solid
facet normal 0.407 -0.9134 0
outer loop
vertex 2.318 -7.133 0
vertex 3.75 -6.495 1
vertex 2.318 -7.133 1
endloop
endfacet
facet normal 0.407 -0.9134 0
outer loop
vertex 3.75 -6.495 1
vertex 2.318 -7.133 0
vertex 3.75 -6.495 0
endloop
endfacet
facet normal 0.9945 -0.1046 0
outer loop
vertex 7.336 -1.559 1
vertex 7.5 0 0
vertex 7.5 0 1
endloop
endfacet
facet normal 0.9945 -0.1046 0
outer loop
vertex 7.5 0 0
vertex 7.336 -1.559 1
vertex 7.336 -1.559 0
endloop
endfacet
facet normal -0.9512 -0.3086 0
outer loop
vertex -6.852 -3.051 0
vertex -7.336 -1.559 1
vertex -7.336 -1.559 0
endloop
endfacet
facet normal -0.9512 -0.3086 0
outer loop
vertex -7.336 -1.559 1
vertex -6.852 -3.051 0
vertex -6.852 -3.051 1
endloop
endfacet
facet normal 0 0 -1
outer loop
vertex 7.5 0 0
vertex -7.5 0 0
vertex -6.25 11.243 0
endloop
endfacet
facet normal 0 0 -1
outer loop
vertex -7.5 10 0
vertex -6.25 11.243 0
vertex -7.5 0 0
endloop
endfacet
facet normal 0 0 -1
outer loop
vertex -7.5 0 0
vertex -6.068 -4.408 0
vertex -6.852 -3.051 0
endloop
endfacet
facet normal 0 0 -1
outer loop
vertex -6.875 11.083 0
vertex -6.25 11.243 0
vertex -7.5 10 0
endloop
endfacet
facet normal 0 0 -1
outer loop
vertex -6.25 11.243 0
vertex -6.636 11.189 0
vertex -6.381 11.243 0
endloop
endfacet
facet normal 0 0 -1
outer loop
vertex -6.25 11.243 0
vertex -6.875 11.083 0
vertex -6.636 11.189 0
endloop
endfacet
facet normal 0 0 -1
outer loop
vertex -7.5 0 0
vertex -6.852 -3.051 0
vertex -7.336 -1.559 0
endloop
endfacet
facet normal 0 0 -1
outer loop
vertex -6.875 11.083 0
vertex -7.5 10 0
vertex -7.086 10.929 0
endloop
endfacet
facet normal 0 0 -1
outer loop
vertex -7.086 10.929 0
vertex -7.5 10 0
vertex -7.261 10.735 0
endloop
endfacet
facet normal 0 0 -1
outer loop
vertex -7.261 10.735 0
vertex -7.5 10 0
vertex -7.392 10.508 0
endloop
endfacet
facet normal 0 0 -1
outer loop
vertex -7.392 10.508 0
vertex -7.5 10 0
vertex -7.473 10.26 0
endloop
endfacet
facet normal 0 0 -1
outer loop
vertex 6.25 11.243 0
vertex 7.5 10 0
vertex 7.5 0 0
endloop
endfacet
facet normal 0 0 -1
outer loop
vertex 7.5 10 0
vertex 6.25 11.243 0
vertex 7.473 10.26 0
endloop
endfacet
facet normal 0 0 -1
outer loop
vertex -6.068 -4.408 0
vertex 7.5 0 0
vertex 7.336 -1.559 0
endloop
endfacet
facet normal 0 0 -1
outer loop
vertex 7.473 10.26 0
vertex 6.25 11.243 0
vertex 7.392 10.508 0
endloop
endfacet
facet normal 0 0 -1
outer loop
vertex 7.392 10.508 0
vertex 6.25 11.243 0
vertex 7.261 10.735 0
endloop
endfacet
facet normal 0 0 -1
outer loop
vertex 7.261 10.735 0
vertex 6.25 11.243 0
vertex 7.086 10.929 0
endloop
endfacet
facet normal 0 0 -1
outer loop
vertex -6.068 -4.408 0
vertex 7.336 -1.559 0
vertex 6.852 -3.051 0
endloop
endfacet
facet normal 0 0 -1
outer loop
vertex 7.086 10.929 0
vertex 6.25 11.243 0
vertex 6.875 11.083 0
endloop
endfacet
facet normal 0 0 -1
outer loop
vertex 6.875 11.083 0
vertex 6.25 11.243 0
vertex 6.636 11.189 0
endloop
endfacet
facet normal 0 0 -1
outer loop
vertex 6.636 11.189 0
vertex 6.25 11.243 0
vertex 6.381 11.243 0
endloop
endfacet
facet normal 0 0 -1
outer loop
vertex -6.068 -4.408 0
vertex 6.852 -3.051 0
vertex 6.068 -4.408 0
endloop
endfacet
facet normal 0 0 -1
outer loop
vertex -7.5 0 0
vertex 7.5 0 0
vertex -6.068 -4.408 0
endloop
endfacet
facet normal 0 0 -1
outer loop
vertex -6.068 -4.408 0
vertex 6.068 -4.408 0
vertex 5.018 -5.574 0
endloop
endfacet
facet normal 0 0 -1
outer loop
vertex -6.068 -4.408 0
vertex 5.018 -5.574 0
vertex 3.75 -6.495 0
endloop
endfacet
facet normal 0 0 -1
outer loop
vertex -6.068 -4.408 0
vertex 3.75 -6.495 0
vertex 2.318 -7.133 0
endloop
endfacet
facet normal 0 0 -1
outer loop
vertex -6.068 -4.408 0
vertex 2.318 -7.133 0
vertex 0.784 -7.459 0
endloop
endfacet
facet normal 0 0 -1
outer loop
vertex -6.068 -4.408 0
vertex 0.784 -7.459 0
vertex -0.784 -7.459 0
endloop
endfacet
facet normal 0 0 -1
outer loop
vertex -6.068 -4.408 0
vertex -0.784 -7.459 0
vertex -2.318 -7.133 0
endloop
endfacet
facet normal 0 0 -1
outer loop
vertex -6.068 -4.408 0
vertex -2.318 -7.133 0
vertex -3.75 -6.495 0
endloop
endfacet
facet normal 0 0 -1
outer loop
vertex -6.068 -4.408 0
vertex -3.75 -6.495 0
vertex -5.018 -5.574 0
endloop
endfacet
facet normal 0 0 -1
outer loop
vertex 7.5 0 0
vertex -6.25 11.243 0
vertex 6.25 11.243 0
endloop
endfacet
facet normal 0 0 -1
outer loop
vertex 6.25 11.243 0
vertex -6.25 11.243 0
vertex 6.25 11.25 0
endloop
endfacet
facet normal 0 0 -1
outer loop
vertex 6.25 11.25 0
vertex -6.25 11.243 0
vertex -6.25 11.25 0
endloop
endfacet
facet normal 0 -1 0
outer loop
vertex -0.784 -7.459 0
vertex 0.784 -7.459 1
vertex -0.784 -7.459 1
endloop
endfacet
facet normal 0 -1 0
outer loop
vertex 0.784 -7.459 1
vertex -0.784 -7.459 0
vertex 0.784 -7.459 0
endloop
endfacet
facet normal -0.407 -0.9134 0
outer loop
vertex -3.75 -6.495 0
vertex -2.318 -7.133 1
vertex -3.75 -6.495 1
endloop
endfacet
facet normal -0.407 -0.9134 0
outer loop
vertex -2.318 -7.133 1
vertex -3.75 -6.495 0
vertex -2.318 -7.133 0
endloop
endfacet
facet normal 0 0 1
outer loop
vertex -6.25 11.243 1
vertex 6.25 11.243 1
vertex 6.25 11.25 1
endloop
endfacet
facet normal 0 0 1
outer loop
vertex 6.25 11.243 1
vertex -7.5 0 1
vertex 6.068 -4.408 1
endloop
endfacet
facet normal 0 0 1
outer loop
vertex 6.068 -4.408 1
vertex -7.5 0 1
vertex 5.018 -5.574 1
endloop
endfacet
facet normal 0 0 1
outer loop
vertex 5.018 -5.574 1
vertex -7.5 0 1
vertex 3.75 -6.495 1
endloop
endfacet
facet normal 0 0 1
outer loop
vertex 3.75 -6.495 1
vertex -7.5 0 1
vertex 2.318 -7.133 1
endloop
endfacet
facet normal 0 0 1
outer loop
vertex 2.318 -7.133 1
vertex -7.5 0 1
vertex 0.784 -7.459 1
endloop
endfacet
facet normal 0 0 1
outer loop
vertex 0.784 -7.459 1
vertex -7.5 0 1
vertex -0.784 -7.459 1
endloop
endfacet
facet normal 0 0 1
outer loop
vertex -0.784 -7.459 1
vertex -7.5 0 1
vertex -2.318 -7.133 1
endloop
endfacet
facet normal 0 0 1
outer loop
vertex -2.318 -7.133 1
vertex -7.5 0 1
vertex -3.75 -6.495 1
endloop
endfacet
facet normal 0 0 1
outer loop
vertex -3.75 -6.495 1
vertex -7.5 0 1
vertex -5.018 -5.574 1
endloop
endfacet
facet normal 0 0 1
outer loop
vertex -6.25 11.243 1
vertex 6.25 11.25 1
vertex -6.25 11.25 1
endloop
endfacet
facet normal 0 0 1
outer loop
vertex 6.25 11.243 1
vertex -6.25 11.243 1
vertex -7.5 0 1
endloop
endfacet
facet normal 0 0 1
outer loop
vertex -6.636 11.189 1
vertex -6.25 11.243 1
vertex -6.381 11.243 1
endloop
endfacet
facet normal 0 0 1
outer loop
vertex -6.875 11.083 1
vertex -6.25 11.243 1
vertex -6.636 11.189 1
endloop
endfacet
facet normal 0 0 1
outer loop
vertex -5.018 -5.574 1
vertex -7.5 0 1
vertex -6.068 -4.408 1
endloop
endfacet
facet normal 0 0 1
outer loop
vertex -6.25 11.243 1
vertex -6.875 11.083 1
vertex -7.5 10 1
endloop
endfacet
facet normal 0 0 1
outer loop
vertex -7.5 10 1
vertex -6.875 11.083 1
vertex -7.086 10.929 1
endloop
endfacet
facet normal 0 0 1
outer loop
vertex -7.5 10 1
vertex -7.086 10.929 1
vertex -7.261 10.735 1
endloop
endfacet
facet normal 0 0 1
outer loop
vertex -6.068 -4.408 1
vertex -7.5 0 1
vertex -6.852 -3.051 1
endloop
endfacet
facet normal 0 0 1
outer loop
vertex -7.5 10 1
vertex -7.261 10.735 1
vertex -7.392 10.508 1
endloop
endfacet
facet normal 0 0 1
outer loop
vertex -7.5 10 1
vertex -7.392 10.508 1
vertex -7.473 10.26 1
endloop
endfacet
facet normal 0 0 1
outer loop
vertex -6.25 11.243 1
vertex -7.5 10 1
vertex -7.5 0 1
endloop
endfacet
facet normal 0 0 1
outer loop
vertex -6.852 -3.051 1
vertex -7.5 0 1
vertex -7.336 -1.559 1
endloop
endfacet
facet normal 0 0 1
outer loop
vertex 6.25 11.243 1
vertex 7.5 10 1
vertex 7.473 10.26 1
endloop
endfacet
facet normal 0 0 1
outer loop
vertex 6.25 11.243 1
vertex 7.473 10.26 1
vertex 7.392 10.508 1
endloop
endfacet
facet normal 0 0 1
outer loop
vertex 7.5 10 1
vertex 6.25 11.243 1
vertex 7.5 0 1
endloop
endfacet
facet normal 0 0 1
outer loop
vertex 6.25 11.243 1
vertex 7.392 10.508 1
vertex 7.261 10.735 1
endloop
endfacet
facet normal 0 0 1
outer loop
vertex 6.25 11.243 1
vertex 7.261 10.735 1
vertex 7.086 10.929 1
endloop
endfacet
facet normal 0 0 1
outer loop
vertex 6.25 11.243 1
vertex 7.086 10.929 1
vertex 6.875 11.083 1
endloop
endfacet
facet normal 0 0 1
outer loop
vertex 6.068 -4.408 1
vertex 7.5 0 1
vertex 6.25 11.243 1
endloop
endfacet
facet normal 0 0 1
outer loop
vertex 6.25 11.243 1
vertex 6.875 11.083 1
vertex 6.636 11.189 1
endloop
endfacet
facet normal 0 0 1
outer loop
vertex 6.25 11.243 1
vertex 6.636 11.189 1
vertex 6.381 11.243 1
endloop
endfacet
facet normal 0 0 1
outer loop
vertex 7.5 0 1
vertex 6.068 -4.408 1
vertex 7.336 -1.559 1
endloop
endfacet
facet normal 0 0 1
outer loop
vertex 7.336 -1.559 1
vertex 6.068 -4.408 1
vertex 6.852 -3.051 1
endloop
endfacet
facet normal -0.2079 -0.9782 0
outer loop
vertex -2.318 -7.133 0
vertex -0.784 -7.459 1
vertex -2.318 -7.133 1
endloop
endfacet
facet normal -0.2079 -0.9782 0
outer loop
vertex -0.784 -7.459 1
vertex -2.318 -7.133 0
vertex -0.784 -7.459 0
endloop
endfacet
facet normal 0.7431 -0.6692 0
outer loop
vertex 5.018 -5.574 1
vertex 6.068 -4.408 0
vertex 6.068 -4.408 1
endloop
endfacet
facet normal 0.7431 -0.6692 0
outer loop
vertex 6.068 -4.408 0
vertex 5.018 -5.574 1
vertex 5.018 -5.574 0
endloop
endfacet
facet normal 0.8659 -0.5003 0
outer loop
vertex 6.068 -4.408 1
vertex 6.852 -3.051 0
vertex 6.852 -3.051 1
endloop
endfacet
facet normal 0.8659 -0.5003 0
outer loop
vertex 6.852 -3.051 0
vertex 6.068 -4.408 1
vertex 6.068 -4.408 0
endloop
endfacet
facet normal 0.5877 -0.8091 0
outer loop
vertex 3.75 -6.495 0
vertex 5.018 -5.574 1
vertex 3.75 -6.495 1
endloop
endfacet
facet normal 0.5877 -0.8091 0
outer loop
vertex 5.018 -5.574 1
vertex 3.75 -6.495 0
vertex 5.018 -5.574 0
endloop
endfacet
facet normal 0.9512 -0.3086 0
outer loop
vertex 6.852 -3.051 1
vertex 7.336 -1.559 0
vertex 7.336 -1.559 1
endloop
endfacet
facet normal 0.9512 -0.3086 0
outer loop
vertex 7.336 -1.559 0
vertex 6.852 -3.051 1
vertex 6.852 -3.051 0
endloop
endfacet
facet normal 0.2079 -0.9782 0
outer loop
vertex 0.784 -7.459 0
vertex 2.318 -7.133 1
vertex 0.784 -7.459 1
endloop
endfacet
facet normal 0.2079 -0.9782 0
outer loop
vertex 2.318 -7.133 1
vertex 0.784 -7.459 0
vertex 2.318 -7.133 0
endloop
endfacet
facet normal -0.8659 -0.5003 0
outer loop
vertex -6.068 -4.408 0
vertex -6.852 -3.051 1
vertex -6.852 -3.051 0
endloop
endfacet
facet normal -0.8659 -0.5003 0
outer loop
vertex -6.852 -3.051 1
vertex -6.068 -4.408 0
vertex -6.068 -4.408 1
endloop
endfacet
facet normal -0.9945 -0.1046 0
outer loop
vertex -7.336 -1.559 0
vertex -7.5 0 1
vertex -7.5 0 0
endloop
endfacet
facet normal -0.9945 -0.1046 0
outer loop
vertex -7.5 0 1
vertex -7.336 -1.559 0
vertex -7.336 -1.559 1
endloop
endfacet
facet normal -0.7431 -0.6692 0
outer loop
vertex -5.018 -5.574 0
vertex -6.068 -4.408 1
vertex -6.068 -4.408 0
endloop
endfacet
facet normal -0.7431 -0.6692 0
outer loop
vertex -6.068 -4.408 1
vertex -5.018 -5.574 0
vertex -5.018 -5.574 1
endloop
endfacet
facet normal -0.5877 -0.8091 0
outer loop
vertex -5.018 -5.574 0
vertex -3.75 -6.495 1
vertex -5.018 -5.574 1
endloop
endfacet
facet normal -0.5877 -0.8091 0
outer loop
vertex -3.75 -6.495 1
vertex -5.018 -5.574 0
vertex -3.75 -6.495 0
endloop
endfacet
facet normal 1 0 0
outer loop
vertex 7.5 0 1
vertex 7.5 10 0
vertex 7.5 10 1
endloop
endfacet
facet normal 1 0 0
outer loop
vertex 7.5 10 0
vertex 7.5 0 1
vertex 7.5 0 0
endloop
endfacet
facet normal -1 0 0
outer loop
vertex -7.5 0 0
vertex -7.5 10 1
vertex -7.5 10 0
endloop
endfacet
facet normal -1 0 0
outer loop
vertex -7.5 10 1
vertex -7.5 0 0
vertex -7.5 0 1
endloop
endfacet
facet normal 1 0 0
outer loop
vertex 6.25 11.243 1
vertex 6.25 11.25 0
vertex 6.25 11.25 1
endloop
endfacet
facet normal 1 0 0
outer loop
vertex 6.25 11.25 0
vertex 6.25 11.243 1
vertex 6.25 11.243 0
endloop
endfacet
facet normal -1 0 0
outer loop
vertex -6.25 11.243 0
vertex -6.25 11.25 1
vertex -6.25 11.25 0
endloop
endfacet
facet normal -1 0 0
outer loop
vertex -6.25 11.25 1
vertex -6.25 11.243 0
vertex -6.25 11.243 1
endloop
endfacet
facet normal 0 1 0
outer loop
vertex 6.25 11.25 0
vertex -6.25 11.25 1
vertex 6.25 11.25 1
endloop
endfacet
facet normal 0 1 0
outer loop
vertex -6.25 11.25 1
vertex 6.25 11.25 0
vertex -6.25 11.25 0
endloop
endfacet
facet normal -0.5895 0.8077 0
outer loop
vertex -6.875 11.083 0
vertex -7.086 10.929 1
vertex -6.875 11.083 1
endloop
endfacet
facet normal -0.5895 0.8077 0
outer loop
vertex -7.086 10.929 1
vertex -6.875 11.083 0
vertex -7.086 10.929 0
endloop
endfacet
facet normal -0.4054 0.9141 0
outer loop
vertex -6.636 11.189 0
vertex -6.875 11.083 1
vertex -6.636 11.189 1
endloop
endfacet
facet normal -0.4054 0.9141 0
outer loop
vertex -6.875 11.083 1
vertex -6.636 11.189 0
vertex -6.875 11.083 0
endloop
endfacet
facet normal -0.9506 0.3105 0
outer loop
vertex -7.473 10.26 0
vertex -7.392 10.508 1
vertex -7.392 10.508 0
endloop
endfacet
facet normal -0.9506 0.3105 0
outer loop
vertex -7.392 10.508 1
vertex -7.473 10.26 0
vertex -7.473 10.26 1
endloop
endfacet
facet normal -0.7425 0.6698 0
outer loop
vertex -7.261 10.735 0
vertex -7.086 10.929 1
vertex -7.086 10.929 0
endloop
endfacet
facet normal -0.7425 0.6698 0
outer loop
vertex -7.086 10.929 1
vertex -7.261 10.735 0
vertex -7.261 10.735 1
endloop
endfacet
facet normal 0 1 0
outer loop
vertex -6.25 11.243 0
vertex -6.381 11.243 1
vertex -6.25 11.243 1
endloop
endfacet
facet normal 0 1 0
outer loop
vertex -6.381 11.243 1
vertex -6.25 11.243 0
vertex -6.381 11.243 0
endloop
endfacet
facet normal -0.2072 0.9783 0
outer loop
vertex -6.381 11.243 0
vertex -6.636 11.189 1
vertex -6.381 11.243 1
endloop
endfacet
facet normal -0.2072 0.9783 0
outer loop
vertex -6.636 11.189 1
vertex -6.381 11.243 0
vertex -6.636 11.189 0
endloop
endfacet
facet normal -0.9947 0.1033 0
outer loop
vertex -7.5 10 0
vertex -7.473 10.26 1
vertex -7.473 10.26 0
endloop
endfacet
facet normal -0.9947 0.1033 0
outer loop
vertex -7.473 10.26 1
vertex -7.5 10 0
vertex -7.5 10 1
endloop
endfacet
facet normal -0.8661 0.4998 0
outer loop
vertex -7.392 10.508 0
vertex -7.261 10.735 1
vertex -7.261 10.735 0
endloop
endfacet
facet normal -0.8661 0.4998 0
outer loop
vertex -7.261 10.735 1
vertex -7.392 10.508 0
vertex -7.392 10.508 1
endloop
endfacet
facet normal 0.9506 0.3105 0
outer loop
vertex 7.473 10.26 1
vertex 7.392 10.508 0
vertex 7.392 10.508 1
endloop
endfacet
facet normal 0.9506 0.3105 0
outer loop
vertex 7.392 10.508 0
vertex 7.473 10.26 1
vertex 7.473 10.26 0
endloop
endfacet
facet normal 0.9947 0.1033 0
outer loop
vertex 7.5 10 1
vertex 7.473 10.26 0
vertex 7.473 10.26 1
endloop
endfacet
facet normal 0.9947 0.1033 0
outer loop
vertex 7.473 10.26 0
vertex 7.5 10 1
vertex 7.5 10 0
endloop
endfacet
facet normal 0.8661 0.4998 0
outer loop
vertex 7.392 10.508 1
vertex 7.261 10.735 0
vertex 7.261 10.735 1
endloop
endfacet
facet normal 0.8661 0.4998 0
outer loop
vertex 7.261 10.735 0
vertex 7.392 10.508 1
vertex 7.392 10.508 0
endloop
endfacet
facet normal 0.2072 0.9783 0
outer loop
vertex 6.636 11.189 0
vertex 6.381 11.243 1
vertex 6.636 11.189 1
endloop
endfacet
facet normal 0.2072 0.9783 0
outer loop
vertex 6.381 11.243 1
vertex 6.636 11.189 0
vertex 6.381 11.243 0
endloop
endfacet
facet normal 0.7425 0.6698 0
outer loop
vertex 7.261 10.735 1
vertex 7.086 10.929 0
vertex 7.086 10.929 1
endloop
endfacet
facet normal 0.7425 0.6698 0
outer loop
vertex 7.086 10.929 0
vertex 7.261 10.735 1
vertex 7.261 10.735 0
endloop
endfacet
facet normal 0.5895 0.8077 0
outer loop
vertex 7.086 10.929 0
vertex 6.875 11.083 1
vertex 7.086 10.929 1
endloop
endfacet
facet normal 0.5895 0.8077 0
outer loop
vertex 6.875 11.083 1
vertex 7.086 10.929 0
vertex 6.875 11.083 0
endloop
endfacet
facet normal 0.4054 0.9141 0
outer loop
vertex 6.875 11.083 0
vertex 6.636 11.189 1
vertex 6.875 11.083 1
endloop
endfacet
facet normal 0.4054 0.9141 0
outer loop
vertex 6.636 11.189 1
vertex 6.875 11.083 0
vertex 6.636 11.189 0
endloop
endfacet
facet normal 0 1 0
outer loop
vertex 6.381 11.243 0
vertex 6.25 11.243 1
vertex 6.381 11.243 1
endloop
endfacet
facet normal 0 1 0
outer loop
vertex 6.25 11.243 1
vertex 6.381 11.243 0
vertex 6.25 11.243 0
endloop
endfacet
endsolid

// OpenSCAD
length=17.5; //[8:35]
width=15; //[5:30]
thickness=1; //[1:4]
difference()
{
union()
{
scale(0.1) cylinder(r=width*5,h=thickness*10);
translate([width/-2,0,0]) scale([width,length-(width/2),thickness]) cube(1);
translate([(width/-2)+1.25,length-(width/2),0]) scale([width-2.5,1.25,thickness]) cube(1);
translate([(width/-2)+1.25,length-(width/2),0]) scale(0.1) cylinder(r=12.5,h=thickness*10);
translate([(width/2)-1.25,length-(width/2),0]) scale(0.1) cylinder(r=12.5,h=thickness*10);
}
}
